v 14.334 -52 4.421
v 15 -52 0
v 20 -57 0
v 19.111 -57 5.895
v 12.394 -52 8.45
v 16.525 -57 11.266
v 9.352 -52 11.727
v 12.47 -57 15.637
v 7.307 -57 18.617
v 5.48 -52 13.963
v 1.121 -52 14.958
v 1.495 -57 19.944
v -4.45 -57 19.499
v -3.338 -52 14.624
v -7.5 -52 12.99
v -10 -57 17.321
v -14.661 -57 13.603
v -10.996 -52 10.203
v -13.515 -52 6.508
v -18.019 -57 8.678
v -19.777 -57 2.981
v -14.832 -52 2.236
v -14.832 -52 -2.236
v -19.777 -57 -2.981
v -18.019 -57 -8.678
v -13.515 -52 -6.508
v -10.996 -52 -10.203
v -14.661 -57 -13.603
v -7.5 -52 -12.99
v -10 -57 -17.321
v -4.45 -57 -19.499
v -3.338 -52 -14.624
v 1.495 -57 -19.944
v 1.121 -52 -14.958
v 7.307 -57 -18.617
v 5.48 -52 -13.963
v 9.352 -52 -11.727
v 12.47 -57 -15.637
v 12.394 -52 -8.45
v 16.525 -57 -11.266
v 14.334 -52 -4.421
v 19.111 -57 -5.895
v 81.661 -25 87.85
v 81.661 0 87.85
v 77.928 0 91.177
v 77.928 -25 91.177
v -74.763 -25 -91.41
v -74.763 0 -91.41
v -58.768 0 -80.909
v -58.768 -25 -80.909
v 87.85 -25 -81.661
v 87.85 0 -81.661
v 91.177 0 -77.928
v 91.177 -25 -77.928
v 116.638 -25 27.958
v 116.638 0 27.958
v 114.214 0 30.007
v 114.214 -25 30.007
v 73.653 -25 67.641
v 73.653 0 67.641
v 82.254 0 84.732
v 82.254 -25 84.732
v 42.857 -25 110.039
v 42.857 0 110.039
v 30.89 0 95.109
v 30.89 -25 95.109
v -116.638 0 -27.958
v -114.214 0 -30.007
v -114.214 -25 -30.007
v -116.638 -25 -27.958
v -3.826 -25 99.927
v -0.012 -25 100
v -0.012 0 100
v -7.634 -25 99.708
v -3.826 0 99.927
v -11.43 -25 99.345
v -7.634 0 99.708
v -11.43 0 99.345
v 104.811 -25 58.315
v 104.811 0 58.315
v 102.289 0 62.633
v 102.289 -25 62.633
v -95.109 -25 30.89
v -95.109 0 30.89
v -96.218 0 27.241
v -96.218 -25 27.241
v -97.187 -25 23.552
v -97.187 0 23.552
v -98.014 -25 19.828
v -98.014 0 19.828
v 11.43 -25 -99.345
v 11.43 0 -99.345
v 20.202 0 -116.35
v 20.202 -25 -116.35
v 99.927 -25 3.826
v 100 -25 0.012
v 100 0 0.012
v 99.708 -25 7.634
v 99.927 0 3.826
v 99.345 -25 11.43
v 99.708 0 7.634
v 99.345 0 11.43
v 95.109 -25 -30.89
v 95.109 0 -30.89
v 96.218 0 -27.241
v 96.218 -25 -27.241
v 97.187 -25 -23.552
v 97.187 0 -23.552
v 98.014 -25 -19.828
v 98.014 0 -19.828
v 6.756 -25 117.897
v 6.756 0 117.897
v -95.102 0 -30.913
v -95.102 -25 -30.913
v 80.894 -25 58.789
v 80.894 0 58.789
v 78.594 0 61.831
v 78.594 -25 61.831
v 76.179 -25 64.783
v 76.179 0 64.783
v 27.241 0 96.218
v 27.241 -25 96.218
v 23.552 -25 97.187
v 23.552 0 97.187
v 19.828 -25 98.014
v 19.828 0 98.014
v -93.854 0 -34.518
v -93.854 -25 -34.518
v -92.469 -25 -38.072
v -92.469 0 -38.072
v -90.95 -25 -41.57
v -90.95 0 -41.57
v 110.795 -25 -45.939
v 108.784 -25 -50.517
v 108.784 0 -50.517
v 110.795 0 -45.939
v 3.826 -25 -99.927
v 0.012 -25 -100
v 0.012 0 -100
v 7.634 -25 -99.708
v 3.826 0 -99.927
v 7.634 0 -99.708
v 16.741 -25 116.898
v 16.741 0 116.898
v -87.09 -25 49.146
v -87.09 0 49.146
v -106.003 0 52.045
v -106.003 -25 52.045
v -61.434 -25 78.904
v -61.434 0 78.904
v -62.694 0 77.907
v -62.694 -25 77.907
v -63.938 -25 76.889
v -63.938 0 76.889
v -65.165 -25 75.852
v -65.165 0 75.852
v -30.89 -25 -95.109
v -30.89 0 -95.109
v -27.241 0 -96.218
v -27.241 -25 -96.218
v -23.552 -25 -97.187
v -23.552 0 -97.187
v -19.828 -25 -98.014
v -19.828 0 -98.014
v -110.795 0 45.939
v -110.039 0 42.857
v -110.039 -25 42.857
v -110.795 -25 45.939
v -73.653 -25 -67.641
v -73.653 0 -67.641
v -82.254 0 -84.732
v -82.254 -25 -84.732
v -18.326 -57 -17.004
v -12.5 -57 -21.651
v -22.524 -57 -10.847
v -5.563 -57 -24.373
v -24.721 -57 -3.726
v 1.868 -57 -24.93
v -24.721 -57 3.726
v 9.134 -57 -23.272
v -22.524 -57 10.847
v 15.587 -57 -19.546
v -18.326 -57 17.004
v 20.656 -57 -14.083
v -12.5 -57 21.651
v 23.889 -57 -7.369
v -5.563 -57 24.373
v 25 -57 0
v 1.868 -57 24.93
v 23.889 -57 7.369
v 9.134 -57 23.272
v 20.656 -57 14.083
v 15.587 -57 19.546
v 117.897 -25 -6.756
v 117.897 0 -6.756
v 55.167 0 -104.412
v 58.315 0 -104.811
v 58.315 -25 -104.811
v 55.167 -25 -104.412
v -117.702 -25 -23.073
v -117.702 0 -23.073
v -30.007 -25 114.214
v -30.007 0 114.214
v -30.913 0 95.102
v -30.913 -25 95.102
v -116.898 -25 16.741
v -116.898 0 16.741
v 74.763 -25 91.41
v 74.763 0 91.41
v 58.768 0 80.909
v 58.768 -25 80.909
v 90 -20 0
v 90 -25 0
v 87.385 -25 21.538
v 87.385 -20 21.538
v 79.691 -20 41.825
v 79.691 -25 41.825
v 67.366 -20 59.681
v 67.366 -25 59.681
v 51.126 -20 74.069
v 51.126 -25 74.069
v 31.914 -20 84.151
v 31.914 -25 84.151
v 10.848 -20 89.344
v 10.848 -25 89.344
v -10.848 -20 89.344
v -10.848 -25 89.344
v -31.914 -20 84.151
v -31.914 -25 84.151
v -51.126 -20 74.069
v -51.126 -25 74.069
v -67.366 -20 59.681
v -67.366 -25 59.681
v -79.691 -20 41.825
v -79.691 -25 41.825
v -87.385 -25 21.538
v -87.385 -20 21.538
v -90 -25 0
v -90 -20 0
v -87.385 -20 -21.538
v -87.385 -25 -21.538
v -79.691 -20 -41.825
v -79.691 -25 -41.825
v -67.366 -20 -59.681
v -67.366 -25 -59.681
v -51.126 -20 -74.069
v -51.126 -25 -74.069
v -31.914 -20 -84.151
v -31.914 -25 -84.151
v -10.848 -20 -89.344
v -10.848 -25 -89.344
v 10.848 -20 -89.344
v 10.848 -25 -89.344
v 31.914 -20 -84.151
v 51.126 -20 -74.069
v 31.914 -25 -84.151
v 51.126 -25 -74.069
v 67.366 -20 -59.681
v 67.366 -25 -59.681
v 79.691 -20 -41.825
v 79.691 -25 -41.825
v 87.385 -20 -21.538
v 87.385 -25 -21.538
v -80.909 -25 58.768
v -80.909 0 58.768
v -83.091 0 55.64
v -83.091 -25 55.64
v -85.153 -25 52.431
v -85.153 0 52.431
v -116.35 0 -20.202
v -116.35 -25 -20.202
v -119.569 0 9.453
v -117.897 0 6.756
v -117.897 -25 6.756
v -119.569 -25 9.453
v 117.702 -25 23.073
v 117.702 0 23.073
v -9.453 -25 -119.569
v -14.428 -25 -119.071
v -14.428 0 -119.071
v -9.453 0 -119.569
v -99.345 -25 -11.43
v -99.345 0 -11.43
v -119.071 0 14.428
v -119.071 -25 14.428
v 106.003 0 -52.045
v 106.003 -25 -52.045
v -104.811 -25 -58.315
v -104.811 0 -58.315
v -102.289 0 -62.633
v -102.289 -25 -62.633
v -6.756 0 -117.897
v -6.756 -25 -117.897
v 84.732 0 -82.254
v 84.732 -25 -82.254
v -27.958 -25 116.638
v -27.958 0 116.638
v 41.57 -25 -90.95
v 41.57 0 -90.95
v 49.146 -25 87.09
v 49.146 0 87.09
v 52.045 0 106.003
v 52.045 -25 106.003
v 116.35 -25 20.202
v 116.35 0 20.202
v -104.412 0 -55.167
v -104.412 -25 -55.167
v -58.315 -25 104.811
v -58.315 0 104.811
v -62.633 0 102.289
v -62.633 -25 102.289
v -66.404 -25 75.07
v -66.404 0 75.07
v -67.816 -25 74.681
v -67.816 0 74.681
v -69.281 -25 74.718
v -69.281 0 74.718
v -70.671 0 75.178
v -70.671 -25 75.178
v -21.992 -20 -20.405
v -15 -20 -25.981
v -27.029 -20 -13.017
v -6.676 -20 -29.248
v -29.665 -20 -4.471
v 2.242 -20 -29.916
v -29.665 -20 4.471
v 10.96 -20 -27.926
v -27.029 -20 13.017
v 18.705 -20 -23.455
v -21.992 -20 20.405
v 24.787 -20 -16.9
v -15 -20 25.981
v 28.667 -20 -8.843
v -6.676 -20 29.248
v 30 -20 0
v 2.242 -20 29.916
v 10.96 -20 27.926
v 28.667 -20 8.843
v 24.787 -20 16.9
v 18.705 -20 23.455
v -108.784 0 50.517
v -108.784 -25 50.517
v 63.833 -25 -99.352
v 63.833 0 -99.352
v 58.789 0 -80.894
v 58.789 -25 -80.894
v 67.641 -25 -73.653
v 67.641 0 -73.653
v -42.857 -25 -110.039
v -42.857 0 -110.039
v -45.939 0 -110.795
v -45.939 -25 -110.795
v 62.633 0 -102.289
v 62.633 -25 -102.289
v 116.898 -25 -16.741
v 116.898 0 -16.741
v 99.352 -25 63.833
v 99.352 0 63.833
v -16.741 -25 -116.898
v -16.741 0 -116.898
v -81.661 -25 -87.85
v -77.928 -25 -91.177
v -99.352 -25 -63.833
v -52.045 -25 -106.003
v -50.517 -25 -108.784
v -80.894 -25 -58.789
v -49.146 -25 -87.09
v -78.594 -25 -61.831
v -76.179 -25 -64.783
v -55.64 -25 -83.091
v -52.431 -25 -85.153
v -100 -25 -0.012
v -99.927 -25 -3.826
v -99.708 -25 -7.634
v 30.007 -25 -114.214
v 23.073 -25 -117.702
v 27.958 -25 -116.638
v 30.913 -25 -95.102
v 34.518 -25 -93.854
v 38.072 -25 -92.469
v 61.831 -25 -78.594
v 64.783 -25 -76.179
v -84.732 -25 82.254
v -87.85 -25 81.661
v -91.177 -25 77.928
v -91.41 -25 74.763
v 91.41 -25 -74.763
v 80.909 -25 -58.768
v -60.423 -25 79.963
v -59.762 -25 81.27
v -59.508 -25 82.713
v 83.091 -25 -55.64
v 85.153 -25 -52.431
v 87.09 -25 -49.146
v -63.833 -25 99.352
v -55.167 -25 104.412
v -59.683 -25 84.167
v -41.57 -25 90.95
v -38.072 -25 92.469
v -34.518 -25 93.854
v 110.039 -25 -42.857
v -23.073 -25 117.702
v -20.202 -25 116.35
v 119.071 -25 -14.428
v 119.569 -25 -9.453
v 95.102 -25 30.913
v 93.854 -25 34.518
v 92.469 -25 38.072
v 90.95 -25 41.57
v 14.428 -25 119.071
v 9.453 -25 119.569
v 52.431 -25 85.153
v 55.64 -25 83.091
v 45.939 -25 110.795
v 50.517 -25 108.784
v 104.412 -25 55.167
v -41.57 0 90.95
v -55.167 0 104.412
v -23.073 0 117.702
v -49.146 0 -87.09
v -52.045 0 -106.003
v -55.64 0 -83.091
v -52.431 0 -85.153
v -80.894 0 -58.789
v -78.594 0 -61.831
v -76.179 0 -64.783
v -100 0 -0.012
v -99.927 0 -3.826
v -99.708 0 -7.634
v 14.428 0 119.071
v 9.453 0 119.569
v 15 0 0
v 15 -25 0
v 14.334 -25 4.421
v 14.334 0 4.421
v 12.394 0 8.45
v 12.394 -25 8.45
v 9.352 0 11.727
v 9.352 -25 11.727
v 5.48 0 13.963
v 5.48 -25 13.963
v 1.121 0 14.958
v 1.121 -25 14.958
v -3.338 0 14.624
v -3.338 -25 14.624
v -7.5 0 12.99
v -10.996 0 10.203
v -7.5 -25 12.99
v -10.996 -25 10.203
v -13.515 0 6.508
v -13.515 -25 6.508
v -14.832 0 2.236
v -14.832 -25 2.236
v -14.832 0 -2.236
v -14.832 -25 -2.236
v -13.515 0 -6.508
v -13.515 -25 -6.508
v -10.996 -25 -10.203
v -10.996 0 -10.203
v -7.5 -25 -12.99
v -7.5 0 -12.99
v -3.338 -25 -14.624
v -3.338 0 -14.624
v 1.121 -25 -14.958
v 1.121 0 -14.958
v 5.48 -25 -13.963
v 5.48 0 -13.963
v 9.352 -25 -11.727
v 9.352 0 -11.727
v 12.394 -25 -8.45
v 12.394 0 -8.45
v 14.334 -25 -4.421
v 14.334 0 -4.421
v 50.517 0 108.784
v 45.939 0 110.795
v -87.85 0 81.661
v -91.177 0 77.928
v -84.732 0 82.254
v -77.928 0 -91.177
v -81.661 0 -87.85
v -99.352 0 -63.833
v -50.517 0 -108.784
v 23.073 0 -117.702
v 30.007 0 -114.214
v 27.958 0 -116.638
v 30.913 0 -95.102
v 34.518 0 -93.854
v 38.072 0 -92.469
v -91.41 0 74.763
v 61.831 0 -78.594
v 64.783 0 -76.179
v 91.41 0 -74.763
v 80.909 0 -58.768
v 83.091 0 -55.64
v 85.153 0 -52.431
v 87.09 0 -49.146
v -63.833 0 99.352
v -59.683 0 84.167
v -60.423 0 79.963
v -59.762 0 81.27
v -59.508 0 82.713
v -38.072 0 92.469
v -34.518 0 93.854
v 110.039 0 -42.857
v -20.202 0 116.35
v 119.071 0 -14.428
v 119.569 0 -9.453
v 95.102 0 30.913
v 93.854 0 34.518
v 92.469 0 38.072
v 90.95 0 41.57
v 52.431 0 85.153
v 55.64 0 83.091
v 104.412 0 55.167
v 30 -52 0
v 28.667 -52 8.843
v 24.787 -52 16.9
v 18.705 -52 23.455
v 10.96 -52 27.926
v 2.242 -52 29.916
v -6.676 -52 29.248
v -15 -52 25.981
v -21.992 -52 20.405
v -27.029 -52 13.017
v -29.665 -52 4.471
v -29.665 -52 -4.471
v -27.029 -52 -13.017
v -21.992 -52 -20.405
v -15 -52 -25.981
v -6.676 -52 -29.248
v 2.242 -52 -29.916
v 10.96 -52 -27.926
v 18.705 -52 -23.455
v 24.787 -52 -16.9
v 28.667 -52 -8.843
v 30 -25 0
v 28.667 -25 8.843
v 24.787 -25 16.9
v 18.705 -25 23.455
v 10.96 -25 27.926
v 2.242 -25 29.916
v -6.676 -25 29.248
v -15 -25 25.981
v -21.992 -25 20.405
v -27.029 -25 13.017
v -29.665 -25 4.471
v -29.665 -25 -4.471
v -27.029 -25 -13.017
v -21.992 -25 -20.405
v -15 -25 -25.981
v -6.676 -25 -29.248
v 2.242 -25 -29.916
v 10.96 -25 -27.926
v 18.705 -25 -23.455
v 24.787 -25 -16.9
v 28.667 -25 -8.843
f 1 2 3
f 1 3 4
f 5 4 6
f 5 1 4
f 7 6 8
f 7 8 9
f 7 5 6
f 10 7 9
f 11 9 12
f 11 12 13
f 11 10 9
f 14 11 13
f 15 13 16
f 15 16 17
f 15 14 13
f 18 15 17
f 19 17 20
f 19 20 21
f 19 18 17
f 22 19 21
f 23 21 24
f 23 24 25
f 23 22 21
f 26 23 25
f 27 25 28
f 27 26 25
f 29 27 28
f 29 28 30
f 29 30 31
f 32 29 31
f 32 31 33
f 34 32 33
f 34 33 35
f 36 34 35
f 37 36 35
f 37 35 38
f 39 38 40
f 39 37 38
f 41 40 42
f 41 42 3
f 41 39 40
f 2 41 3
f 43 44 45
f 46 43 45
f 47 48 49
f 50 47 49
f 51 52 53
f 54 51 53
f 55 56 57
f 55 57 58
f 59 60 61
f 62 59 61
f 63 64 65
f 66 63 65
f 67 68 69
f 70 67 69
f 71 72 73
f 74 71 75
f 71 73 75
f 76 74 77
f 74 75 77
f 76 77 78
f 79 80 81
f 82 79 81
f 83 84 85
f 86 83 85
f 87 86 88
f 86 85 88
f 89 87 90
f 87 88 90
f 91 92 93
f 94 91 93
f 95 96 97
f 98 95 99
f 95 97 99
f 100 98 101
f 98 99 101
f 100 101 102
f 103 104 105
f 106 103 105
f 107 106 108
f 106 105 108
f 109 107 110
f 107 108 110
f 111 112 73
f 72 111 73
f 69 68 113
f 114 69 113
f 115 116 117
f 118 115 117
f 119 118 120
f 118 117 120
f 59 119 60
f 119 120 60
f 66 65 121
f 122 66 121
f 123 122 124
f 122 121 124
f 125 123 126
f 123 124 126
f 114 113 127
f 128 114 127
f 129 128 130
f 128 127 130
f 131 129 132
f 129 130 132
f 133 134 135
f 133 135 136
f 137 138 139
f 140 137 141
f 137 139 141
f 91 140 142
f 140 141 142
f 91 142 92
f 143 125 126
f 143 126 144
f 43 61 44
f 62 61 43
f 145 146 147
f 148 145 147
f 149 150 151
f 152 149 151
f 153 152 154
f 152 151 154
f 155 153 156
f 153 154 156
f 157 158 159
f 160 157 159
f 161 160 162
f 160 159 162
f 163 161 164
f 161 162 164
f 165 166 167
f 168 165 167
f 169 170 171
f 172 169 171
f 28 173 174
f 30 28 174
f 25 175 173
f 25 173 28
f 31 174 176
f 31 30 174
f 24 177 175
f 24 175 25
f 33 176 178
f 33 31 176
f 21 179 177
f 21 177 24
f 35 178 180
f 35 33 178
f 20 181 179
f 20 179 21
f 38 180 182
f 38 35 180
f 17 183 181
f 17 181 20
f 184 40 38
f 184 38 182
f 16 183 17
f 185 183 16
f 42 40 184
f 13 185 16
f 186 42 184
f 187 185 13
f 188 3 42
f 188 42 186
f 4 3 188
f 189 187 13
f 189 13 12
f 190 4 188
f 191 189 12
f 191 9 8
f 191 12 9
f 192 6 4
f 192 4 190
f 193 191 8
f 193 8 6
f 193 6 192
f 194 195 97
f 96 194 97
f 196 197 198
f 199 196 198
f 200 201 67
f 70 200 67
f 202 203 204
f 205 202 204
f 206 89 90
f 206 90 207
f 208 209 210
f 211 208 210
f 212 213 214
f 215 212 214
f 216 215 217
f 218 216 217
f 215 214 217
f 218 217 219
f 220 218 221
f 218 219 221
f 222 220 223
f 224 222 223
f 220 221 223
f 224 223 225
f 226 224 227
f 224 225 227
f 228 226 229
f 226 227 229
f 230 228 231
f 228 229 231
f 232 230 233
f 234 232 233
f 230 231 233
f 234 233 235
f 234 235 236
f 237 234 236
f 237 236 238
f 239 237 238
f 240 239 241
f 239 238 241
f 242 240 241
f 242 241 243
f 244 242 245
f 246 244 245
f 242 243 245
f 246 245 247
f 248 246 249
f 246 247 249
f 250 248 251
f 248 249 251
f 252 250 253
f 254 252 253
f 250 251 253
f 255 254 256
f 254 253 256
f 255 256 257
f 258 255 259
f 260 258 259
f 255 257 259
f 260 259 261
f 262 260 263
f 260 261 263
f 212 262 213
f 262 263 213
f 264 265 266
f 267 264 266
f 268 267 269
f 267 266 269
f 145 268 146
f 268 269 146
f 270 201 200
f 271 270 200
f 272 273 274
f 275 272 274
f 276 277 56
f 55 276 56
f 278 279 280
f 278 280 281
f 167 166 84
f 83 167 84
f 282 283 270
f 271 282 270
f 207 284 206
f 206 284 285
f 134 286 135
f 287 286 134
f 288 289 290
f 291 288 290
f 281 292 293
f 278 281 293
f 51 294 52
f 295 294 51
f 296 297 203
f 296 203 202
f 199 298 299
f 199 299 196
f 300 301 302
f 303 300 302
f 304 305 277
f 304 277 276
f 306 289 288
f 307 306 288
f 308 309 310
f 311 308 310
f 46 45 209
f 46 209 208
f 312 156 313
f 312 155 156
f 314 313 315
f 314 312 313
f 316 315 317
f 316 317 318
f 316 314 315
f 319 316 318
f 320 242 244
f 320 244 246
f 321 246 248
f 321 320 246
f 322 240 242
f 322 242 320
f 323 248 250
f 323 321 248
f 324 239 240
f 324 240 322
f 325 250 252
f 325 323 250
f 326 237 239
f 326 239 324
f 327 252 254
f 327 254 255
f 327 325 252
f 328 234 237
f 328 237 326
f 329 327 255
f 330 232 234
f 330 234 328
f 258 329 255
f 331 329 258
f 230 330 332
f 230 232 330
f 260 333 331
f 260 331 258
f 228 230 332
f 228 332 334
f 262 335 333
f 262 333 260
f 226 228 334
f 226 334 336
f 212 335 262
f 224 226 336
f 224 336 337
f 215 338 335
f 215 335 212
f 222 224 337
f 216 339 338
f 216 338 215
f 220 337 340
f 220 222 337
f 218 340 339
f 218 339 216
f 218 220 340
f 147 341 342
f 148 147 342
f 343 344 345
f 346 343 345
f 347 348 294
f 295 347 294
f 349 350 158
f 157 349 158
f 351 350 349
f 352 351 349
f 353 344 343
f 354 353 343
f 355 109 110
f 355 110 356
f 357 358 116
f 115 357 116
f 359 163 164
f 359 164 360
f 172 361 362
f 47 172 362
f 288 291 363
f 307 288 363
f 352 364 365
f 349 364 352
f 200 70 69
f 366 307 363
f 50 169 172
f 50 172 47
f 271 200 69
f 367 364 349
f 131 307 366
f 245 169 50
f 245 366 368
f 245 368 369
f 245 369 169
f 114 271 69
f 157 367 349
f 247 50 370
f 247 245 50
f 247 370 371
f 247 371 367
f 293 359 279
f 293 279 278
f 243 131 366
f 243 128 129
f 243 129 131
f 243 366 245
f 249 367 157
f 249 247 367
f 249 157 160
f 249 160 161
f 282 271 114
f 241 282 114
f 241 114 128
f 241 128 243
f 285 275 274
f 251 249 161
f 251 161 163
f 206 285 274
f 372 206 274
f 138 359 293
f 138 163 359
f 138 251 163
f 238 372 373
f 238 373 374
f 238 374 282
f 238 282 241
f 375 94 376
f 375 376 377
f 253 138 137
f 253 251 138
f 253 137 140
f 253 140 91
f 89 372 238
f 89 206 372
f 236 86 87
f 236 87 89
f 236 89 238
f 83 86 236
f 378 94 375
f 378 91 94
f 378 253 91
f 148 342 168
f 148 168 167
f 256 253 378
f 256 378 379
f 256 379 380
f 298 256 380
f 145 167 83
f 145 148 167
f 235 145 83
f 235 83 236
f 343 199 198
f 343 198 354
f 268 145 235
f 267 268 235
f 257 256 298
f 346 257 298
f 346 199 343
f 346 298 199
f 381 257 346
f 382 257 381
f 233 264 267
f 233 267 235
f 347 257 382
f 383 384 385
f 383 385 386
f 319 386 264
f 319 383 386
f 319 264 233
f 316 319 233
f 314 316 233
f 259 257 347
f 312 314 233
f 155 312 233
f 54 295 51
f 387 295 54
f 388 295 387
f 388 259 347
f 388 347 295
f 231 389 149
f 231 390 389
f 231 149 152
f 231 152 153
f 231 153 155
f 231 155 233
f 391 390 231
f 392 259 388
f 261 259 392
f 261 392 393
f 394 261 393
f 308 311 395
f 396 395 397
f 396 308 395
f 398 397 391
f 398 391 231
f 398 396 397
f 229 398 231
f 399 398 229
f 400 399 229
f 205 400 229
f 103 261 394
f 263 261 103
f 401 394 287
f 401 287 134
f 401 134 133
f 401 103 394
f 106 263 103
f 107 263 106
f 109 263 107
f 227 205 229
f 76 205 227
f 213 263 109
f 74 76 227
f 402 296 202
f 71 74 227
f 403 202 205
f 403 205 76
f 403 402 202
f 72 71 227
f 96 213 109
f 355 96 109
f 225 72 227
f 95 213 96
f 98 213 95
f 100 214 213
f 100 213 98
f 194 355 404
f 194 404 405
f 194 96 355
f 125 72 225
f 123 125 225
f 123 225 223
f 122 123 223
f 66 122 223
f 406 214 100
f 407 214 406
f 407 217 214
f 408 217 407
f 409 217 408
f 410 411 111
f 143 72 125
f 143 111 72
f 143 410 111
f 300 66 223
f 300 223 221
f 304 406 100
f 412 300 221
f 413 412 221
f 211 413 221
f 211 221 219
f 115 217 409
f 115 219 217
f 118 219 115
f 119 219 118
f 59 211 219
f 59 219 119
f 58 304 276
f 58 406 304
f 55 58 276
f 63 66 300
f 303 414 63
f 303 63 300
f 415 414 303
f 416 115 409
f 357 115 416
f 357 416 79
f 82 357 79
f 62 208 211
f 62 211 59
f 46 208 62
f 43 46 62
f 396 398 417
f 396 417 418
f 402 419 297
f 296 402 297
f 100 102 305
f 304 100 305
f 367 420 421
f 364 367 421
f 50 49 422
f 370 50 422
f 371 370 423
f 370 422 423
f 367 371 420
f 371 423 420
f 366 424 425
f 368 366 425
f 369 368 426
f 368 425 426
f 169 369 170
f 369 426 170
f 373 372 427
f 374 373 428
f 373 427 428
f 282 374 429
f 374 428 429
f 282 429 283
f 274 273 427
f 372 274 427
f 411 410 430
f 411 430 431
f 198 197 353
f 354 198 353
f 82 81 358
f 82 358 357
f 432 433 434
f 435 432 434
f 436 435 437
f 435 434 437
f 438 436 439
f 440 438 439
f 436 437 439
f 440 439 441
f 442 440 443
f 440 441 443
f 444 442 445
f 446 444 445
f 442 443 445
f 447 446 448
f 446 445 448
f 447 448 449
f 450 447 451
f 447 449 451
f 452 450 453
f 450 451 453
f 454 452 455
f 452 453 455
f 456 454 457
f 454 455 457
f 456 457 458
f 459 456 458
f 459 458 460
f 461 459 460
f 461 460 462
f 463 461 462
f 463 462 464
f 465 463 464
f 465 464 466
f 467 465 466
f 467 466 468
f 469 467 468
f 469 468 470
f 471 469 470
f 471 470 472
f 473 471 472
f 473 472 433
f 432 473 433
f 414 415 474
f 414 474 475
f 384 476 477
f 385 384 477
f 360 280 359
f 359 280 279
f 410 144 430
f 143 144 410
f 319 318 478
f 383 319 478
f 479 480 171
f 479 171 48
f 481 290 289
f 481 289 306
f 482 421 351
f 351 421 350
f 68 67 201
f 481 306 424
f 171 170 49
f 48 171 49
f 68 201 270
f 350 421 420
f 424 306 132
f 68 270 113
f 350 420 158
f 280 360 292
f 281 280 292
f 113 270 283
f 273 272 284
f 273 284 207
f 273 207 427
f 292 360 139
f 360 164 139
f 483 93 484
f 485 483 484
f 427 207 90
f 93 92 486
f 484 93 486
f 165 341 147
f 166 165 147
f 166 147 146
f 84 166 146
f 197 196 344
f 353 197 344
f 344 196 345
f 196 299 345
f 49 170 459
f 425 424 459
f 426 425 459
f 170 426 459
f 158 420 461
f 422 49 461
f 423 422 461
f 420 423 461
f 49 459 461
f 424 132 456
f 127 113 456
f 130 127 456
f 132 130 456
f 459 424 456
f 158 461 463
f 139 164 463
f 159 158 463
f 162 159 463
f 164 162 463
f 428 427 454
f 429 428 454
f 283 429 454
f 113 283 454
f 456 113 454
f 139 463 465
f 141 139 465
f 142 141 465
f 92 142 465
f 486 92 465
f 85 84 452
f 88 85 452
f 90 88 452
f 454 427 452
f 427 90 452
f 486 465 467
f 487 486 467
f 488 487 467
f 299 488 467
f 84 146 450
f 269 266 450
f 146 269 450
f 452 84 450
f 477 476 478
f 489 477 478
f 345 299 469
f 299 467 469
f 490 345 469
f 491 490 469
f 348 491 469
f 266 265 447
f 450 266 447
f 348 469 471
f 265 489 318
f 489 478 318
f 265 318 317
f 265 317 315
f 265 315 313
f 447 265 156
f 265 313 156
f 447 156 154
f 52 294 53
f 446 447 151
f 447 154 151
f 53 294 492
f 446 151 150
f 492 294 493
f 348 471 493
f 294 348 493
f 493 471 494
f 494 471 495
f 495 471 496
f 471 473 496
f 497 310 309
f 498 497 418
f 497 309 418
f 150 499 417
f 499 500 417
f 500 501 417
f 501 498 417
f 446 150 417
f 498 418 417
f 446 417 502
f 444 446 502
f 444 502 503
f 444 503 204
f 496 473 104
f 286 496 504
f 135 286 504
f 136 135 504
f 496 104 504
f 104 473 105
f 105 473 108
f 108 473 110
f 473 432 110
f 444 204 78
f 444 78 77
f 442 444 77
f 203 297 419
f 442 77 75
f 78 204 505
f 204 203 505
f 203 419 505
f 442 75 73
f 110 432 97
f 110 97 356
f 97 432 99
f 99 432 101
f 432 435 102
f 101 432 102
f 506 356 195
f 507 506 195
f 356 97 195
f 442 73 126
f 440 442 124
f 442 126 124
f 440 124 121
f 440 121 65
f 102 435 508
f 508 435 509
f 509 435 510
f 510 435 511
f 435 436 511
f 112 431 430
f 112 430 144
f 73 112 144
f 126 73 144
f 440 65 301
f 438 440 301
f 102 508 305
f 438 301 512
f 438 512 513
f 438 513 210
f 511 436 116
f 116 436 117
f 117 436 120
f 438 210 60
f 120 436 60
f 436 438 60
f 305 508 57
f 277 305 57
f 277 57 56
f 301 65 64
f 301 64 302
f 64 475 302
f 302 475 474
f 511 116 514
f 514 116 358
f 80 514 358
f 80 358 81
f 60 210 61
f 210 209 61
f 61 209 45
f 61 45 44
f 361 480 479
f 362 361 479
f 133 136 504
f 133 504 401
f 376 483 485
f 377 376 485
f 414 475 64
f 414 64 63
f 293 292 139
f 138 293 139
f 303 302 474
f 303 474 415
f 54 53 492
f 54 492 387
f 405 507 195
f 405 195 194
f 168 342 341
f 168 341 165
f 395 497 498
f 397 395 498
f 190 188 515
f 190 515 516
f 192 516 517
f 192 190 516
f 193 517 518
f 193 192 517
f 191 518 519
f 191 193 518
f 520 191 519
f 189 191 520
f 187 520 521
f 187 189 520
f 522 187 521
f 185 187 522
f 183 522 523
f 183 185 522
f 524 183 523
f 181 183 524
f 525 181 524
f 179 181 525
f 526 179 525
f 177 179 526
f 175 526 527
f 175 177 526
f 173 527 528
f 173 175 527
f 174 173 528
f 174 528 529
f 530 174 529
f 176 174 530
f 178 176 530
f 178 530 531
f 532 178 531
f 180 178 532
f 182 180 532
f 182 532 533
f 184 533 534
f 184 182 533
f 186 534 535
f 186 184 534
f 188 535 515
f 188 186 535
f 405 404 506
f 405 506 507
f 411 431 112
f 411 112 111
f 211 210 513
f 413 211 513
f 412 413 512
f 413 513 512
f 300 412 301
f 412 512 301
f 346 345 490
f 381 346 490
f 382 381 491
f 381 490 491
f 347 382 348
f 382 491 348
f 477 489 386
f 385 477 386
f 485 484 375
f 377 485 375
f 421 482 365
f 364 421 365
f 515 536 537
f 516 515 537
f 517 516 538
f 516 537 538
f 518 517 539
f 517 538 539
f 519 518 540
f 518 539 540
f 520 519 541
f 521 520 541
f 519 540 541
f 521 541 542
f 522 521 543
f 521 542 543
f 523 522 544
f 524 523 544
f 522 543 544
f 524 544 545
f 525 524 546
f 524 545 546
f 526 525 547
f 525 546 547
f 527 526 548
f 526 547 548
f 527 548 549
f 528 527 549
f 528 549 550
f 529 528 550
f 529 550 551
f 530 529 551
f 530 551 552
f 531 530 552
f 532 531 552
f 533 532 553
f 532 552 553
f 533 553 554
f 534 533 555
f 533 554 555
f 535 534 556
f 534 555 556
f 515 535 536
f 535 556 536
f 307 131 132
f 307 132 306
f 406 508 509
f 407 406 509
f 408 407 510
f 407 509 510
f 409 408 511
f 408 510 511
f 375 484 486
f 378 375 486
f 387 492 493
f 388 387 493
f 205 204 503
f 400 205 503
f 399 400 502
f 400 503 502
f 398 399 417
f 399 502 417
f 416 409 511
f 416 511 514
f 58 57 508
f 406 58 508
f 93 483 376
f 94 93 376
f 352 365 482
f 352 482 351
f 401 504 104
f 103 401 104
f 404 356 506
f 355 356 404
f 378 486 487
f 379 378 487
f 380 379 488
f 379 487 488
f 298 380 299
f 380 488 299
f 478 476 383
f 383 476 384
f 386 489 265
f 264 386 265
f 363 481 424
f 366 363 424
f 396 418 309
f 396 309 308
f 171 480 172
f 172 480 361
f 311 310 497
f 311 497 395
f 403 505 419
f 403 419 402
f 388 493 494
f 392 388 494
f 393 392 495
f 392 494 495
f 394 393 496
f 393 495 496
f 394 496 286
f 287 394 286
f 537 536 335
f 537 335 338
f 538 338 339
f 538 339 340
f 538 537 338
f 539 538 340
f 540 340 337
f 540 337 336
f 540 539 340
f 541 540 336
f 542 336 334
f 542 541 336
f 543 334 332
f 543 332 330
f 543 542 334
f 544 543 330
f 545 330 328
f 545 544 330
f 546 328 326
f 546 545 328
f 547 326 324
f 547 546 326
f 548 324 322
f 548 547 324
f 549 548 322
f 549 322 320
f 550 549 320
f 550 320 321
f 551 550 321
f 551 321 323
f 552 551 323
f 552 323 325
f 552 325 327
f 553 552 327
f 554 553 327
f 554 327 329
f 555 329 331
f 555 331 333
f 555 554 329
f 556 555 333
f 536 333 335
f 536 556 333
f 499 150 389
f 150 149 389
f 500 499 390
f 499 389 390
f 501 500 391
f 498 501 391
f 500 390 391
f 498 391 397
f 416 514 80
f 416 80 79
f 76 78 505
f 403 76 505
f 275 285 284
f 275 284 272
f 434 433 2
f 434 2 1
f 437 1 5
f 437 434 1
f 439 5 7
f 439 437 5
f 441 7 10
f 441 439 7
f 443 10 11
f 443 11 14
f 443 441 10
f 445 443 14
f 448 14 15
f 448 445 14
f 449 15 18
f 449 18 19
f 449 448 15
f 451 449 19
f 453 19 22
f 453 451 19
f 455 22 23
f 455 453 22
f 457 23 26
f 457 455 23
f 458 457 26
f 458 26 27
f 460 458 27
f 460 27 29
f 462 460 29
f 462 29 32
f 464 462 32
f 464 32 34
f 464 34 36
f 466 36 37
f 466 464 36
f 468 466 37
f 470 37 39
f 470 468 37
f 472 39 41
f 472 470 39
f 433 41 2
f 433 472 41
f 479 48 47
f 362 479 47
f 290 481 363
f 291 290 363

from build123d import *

# Parameters (mm, degrees)
F1_DEPTH  = 25
F2_R      = 5
F3_R      = 5
F4_R      = 30
F4_R_2    = 15
F5_DEPTH  = 32
F6_DEPTH  = 25.001
F7_SIZE   = 5
F8_SIZE   = 5
F4_R_3    = 90
F9_DEPTH  = 5
F10_SIZE2 = 2
F10_SIZE  = 2


with BuildPart() as f1:
    # F0 (on Front) → F1 (new body)
    with BuildSketch(Plane.XZ):
        with BuildLine():
            ThreePointArc((98.0144936682, -19.8282382213), (99.5023853152, -9.9636999447), (100, 0))
            ThreePointArc((100, 0), (99.9999998078, 0.006199626), (99.9999992313, 0.0123992521))
            ThreePointArc((99.9999992313, 0.0123992521), (99.835656814, 5.7307616008), (99.3445854734, 11.4303690715))
            ThreePointArc((99.3445854734, 11.4303690715), (97.7100255855, 21.2779439815), (95.1018193188, 30.9134915894))
            ThreePointArc((95.1018193188, 30.9134915894), (93.1784492462, 36.3011927639), (90.9501370781, 41.5700921996))
            ThreePointArc((90.9501370781, 41.5700921996), (86.3525102448, 50.4305857037), (80.8944107181, 58.788555983))
            ThreePointArc((80.8944107181, 58.788555983), (77.4002858537, 63.3182102539), (73.6528555786, 67.6406450672))
            ThreePointArc((73.6528555786, 67.6406450672), (66.5422095481, 74.6467303267), (58.7684935718, 80.9089869131))
            ThreePointArc((58.7684935718, 80.9089869131), (54.0456432024, 84.1372001604), (49.1459194055, 87.0900603156))
            ThreePointArc((49.1459194055, 87.0900603156), (40.2182937539, 91.5559328909), (30.8899068105, 95.109482478))
            ThreePointArc((30.8899068105, 95.109482478), (25.4006364363, 96.7202546969), (19.8282382213, 98.0144936682))
            ThreePointArc((19.8282382213, 98.0144936682), (9.9575311498, 99.5030028361), (-0.0123992521, 99.9999992313))
            ThreePointArc((-0.0123992521, 99.9999992313), (-5.7307616008, 99.835656814), (-11.4303690715, 99.3445854734))
            ThreePointArc((-11.4303690715, 99.3445854734), (-21.2779439815, 97.7100255855), (-30.9134915894, 95.1018193188))
            ThreePointArc((-30.9134915894, 95.1018193188), (-36.3011927639, 93.1784492462), (-41.5700921996, 90.9501370781))
            ThreePointArc((-41.5700921996, 90.9501370781), (-50.4305857037, 86.3525102448), (-58.788555983, 80.8944107181))
            ThreePointArc((-58.788555983, 80.8944107181), (-63.3182102539, 77.4002858537), (-67.6406450672, 73.6528555786))
            ThreePointArc((-67.6406450672, 73.6528555786), (-74.6467303267, 66.5422095481), (-80.9089869131, 58.7684935718))
            ThreePointArc((-80.9089869131, 58.7684935718), (-84.1372001604, 54.0456432024), (-87.0900603156, 49.1459194055))
            ThreePointArc((-87.0900603156, 49.1459194055), (-91.5559328909, 40.2182937539), (-95.109482478, 30.8899068105))
            ThreePointArc((-95.109482478, 30.8899068105), (-96.7202546969, 25.4006364363), (-98.0144936682, 19.8282382213))
            ThreePointArc((-98.0144936682, 19.8282382213), (-99.5030028361, 9.9575311498), (-99.9999992313, -0.0123992521))
            ThreePointArc((-99.9999992313, -0.0123992521), (-99.835656814, -5.7307616008), (-99.3445854734, -11.4303690715))
            ThreePointArc((-99.3445854734, -11.4303690715), (-97.7100255855, -21.2779439815), (-95.1018193188, -30.9134915894))
            ThreePointArc((-95.1018193188, -30.9134915894), (-93.1784492462, -36.3011927639), (-90.9501370781, -41.5700921996))
            ThreePointArc((-90.9501370781, -41.5700921996), (-86.3525102448, -50.4305857037), (-80.8944107181, -58.788555983))
            ThreePointArc((-80.8944107181, -58.788555983), (-77.4002858537, -63.3182102539), (-73.6528555786, -67.6406450672))
            ThreePointArc((-73.6528555786, -67.6406450672), (-66.5422095481, -74.6467303267), (-58.7684935718, -80.9089869131))
            ThreePointArc((-58.7684935718, -80.9089869131), (-54.0456432024, -84.1372001604), (-49.1459194055, -87.0900603156))
            ThreePointArc((-49.1459194055, -87.0900603156), (-40.2182937539, -91.5559328909), (-30.8899068105, -95.109482478))
            ThreePointArc((-30.8899068105, -95.109482478), (-25.4006364363, -96.7202546969), (-19.8282382213, -98.0144936682))
            ThreePointArc((-19.8282382213, -98.0144936682), (-9.9575311498, -99.5030028361), (0.0123992521, -99.9999992313))
            ThreePointArc((0.0123992521, -99.9999992313), (5.7307616008, -99.835656814), (11.4303690715, -99.3445854734))
            ThreePointArc((11.4303690715, -99.3445854734), (21.2779439815, -97.7100255855), (30.9134915894, -95.1018193188))
            ThreePointArc((30.9134915894, -95.1018193188), (36.3011927639, -93.1784492462), (41.5700921996, -90.9501370781))
            ThreePointArc((41.5700921996, -90.9501370781), (50.4305857037, -86.3525102448), (58.788555983, -80.8944107181))
            ThreePointArc((58.788555983, -80.8944107181), (63.3182102539, -77.4002858537), (67.6406450672, -73.6528555786))
            ThreePointArc((67.6406450672, -73.6528555786), (74.6467303267, -66.5422095481), (80.9089869131, -58.7684935718))
            ThreePointArc((80.9089869131, -58.7684935718), (84.1372001604, -54.0456432024), (87.0900603156, -49.1459194055))
            ThreePointArc((87.0900603156, -49.1459194055), (91.5559328909, -40.2182937539), (95.109482478, -30.8899068105))
            ThreePointArc((95.109482478, -30.8899068105), (96.7202546969, -25.4006364363), (98.0144936682, -19.8282382213))
        make_face()
        with BuildLine():
            ThreePointArc((95.1018193188, 30.9134915894), (97.7100255855, 21.2779439815), (99.3445854734, 11.4303690715))
            Line((99.3445854734, 11.4303690715), (118.1270663435, 21.1186220451))
            Line((118.1270663435, 21.1186220451), (116.2120513852, 29.9125243478))
            Line((116.2120513852, 29.9125243478), (95.1018193188, 30.9134915894))
        make_face()
        with BuildLine():
            Line((64.360000029, -101.2807503738), (58.788555983, -80.8944107181))
            ThreePointArc((58.788555983, -80.8944107181), (50.4305857037, -86.3525102448), (41.5700921996, -90.9501370781))
            Line((41.5700921996, -90.9501370781), (56.5882741069, -105.8195030871))
            Line((56.5882741069, -105.8195030871), (64.360000029, -101.2807503738))
        make_face()
        with BuildLine():
            Line((-7.4629976294, -119.76770711), (0.0123992521, -99.9999992313))
            ThreePointArc((0.0123992521, -99.9999992313), (-9.9575311498, -99.5030028361), (-19.8282382213, -98.0144936682))
            Line((-19.8282382213, -98.0144936682), (-16.4182678847, -118.8715293065))
            Line((-16.4182678847, -118.8715293065), (-7.4629976294, -119.76770711))
        make_face()
        with BuildLine():
            Line((29.9125243478, -116.2120513852), (30.9134915894, -95.1018193188))
            ThreePointArc((30.9134915894, -95.1018193188), (21.2779439815, -97.7100255855), (11.4303690715, -99.3445854734))
            Line((11.4303690715, -99.3445854734), (21.1186220451, -118.1270663435))
            Line((21.1186220451, -118.1270663435), (29.9125243478, -116.2120513852))
        make_face()
        with BuildLine():
            Line((92.5074704848, -76.4353838513), (80.9089869131, -58.7684935718))
            ThreePointArc((80.9089869131, -58.7684935718), (74.6467303267, -66.5422095481), (67.6406450672, -73.6528555786))
            Line((67.6406450672, -73.6528555786), (86.5186716255, -83.1535895807))
            Line((86.5186716255, -83.1535895807), (92.5074704848, -76.4353838513))
        make_face()
        with BuildLine():
            ThreePointArc((80.8944107181, 58.788555983), (86.3525102448, 50.4305857037), (90.9501370781, 41.5700921996))
            Line((90.9501370781, 41.5700921996), (105.8195030871, 56.5882741069))
            Line((105.8195030871, 56.5882741069), (101.2807503738, 64.360000029))
            Line((101.2807503738, 64.360000029), (80.8944107181, 58.788555983))
        make_face()
        with BuildLine():
            ThreePointArc((58.7684935718, 80.9089869131), (66.5422095481, 74.6467303267), (73.6528555786, 67.6406450672))
            Line((73.6528555786, 67.6406450672), (83.1535895807, 86.5186716255))
            Line((83.1535895807, 86.5186716255), (76.4353838513, 92.5074704848))
            Line((76.4353838513, 92.5074704848), (58.7684935718, 80.9089869131))
        make_face()
        with BuildLine():
            ThreePointArc((30.8899068105, 95.109482478), (40.2182937539, 91.5559328909), (49.1459194055, 87.0900603156))
            Line((49.1459194055, 87.0900603157), (52.348023361, 107.9800187544))
            Line((52.348023361, 107.9800187544), (44.1079894009, 111.5996651922))
            Line((44.1079894009, 111.5996651922), (30.8899068105, 95.109482478))
        make_face()
        with BuildLine():
            ThreePointArc((-0.0123992521, 99.9999992313), (9.9575311498, 99.5030028361), (19.8282382213, 98.0144936682))
            Line((19.8282382213, 98.0144936682), (16.4182678847, 118.8715293065))
            Line((16.4182678847, 118.8715293065), (7.4629976294, 119.76770711))
            Line((7.4629976294, 119.76770711), (-0.0123992521, 99.9999992313))
        make_face()
        with BuildLine():
            ThreePointArc((-30.9134915894, 95.1018193188), (-21.2779439815, 97.7100255855), (-11.4303690715, 99.3445854734))
            Line((-11.4303690715, 99.3445854734), (-21.1186220451, 118.1270663435))
            Line((-21.1186220451, 118.1270663435), (-29.9125243478, 116.2120513852))
            Line((-29.9125243478, 116.2120513852), (-30.9134915894, 95.1018193188))
        make_face()
        with BuildLine():
            ThreePointArc((-58.788555983, 80.8944107181), (-50.4305857037, 86.3525102448), (-41.5700921996, 90.9501370781))
            Line((-41.5700921996, 90.9501370781), (-56.5882741069, 105.8195030871))
            Line((-56.5882741069, 105.8195030871), (-64.360000029, 101.2807503738))
            Line((-64.360000029, 101.2807503738), (-58.788555983, 80.8944107181))
        make_face()
        with BuildLine():
            ThreePointArc((-80.9089869131, 58.7684935718), (-74.6467303267, 66.5422095481), (-67.6406450672, 73.6528555786))
            Line((-67.6406450672, 73.6528555786), (-86.5186716255, 83.1535895807))
            Line((-86.5186716255, 83.1535895807), (-92.5074704848, 76.4353838513))
            Line((-92.5074704848, 76.4353838513), (-80.9089869131, 58.7684935718))
        make_face()
        with BuildLine():
            ThreePointArc((-95.109482478, 30.8899068105), (-91.5559328909, 40.2182937539), (-87.0900603156, 49.1459194055))
            Line((-87.0900603157, 49.1459194055), (-107.9800187544, 52.348023361))
            Line((-107.9800187544, 52.348023361), (-111.5996651922, 44.1079894009))
            Line((-111.5996651922, 44.1079894009), (-95.109482478, 30.8899068105))
        make_face()
        with BuildLine():
            ThreePointArc((-99.9999992313, -0.0123992521), (-99.5030028361, 9.9575311498), (-98.0144936682, 19.8282382213))
            Line((-98.0144936682, 19.8282382213), (-118.8715293065, 16.4182678847))
            Line((-118.8715293065, 16.4182678847), (-119.76770711, 7.4629976294))
            Line((-119.76770711, 7.4629976294), (-99.9999992313, -0.0123992521))
        make_face()
        with BuildLine():
            Line((-116.2120513852, -29.9125243478), (-95.1018193188, -30.9134915894))
            ThreePointArc((-95.1018193188, -30.9134915894), (-97.7100255855, -21.2779439815), (-99.3445854734, -11.4303690715))
            Line((-99.3445854734, -11.4303690715), (-118.1270663435, -21.1186220451))
            Line((-118.1270663435, -21.1186220451), (-116.2120513852, -29.9125243478))
        make_face()
        with BuildLine():
            Line((-101.2807503738, -64.360000029), (-80.8944107181, -58.788555983))
            ThreePointArc((-80.8944107181, -58.788555983), (-86.3525102448, -50.4305857037), (-90.9501370781, -41.5700921996))
            Line((-90.9501370781, -41.5700921996), (-105.8195030871, -56.5882741069))
            Line((-105.8195030871, -56.5882741069), (-101.2807503738, -64.360000029))
        make_face()
        with BuildLine():
            Line((-76.4353838513, -92.5074704848), (-58.7684935718, -80.9089869131))
            ThreePointArc((-58.7684935718, -80.9089869131), (-66.5422095481, -74.6467303267), (-73.6528555786, -67.6406450672))
            Line((-73.6528555786, -67.6406450672), (-83.1535895807, -86.5186716255))
            Line((-83.1535895807, -86.5186716255), (-76.4353838513, -92.5074704848))
        make_face()
        with BuildLine():
            Line((-44.1079894009, -111.5996651922), (-30.8899068105, -95.109482478))
            ThreePointArc((-30.8899068105, -95.109482478), (-40.2182937539, -91.5559328909), (-49.1459194055, -87.0900603156))
            Line((-49.1459194055, -87.0900603157), (-52.348023361, -107.9800187544))
            Line((-52.348023361, -107.9800187544), (-44.1079894009, -111.5996651922))
        make_face()
        with BuildLine():
            Line((111.5996651922, -44.1079894009), (95.109482478, -30.8899068105))
            ThreePointArc((95.109482478, -30.8899068105), (91.5559328909, -40.2182937539), (87.0900603156, -49.1459194055))
            Line((87.0900603157, -49.1459194055), (107.9800187544, -52.348023361))
            Line((107.9800187544, -52.348023361), (111.5996651922, -44.1079894009))
        make_face()
        with BuildLine():
            ThreePointArc((99.9999992313, 0.0123992521), (99.9999998078, 0.006199626), (100, 0))
            ThreePointArc((100, 0), (99.5023853152, -9.9636999447), (98.0144936682, -19.8282382213))
            Line((98.0144936682, -19.8282382213), (118.8715293065, -16.4182678847))
            Line((118.8715293065, -16.4182678847), (119.76770711, -7.4629976294))
            Line((119.76770711, -7.4629976294), (99.9999992313, 0.0123992521))
        make_face()
    extrude(amount=F1_DEPTH)

    # F2
    f2_edges = [f1.edges().sort_by_distance(p)[0] for p in [
        (-67.640645, -12.5, 73.652856),
    ]]
    fillet(f2_edges, radius=F2_R)

    # F3
    f3_edges = [f1.edges().sort_by_distance(p)[0] for p in [
        (-58.788556, -12.5, 80.894411),
    ]]
    fillet(f3_edges, radius=F3_R)

    # F4 (on face) → F5 (join)
    with BuildSketch(Plane.XZ.offset(25)):
        Circle(F4_R)
        Circle(F4_R_2, mode=Mode.SUBTRACT)
    extrude(amount=F5_DEPTH)

    # F6 (cut, through all): a face of the model
    f6_faces = [f1.faces().sort_by_distance(p)[0] for p in [
        (0, -25, 0),
    ]]
    extrude(f6_faces, amount=-F6_DEPTH, mode=Mode.SUBTRACT)

    # F7
    f7_edges = [f1.edges().sort_by_distance(p)[0] for p in [
        (-30, -57, 0),
    ]]
    chamfer(f7_edges, length=F7_SIZE)

    # F8
    f8_edges = [f1.edges().sort_by_distance(p)[0] for p in [
        (-15, -57, 0),
    ]]
    chamfer(f8_edges, length=F8_SIZE)

    # F4 (on face) → F9 (cut)
    with BuildSketch(Plane.XZ.offset(25)):
        Circle(F4_R_3)
        Circle(F4_R, mode=Mode.SUBTRACT)
    extrude(amount=-F9_DEPTH, mode=Mode.SUBTRACT)

    # F10
    f10_edges = [f1.edges().sort_by_distance(p)[0] for p in [
        (-105.819503, -12.5, -56.588274),
        (-101.28075, -12.5, -64.36),
        (-83.15359, -12.5, -86.518672),
        (-76.435384, -12.5, -92.50747),
        (-52.348023, -12.5, -107.980019),
        (-44.107989, -12.5, -111.599665),
        (-16.418268, -12.5, -118.871529),
        (-7.462998, -12.5, -119.767707),
        (21.118622, -12.5, -118.127066),
        (29.912524, -12.5, -116.212051),
        (56.588274, -12.5, -105.819503),
        (64.36, -12.5, -101.28075),
        (86.518672, -12.5, -83.15359),
        (92.50747, -12.5, -76.435384),
        (107.980019, -12.5, -52.348023),
        (111.599665, -12.5, -44.107989),
        (118.871529, -12.5, -16.418268),
        (119.767707, -12.5, -7.462998),
        (118.127066, -12.5, 21.118622),
        (116.212051, -12.5, 29.912524),
        (105.819503, -12.5, 56.588274),
        (101.28075, -12.5, 64.36),
        (83.15359, -12.5, 86.518672),
        (76.435384, -12.5, 92.50747),
        (52.348023, -12.5, 107.980019),
        (44.107989, -12.5, 111.599665),
        (16.418268, -12.5, 118.871529),
        (7.462998, -12.5, 119.767707),
        (-21.118622, -12.5, 118.127066),
        (-29.912524, -12.5, 116.212051),
        (-56.588274, -12.5, 105.819503),
        (-64.36, -12.5, 101.28075),
        (-86.518672, -12.5, 83.15359),
        (-92.50747, -12.5, 76.435384),
        (-107.980019, -12.5, 52.348023),
        (-111.599665, -12.5, 44.107989),
        (-118.871529, -12.5, 16.418268),
        (-119.767707, -12.5, 7.462998),
        (-118.127066, -12.5, -21.118622),
        (-116.212051, -12.5, -29.912524),
    ]]
    chamfer(f10_edges, length=F10_SIZE, length2=F10_SIZE2)


solid = f1.part
